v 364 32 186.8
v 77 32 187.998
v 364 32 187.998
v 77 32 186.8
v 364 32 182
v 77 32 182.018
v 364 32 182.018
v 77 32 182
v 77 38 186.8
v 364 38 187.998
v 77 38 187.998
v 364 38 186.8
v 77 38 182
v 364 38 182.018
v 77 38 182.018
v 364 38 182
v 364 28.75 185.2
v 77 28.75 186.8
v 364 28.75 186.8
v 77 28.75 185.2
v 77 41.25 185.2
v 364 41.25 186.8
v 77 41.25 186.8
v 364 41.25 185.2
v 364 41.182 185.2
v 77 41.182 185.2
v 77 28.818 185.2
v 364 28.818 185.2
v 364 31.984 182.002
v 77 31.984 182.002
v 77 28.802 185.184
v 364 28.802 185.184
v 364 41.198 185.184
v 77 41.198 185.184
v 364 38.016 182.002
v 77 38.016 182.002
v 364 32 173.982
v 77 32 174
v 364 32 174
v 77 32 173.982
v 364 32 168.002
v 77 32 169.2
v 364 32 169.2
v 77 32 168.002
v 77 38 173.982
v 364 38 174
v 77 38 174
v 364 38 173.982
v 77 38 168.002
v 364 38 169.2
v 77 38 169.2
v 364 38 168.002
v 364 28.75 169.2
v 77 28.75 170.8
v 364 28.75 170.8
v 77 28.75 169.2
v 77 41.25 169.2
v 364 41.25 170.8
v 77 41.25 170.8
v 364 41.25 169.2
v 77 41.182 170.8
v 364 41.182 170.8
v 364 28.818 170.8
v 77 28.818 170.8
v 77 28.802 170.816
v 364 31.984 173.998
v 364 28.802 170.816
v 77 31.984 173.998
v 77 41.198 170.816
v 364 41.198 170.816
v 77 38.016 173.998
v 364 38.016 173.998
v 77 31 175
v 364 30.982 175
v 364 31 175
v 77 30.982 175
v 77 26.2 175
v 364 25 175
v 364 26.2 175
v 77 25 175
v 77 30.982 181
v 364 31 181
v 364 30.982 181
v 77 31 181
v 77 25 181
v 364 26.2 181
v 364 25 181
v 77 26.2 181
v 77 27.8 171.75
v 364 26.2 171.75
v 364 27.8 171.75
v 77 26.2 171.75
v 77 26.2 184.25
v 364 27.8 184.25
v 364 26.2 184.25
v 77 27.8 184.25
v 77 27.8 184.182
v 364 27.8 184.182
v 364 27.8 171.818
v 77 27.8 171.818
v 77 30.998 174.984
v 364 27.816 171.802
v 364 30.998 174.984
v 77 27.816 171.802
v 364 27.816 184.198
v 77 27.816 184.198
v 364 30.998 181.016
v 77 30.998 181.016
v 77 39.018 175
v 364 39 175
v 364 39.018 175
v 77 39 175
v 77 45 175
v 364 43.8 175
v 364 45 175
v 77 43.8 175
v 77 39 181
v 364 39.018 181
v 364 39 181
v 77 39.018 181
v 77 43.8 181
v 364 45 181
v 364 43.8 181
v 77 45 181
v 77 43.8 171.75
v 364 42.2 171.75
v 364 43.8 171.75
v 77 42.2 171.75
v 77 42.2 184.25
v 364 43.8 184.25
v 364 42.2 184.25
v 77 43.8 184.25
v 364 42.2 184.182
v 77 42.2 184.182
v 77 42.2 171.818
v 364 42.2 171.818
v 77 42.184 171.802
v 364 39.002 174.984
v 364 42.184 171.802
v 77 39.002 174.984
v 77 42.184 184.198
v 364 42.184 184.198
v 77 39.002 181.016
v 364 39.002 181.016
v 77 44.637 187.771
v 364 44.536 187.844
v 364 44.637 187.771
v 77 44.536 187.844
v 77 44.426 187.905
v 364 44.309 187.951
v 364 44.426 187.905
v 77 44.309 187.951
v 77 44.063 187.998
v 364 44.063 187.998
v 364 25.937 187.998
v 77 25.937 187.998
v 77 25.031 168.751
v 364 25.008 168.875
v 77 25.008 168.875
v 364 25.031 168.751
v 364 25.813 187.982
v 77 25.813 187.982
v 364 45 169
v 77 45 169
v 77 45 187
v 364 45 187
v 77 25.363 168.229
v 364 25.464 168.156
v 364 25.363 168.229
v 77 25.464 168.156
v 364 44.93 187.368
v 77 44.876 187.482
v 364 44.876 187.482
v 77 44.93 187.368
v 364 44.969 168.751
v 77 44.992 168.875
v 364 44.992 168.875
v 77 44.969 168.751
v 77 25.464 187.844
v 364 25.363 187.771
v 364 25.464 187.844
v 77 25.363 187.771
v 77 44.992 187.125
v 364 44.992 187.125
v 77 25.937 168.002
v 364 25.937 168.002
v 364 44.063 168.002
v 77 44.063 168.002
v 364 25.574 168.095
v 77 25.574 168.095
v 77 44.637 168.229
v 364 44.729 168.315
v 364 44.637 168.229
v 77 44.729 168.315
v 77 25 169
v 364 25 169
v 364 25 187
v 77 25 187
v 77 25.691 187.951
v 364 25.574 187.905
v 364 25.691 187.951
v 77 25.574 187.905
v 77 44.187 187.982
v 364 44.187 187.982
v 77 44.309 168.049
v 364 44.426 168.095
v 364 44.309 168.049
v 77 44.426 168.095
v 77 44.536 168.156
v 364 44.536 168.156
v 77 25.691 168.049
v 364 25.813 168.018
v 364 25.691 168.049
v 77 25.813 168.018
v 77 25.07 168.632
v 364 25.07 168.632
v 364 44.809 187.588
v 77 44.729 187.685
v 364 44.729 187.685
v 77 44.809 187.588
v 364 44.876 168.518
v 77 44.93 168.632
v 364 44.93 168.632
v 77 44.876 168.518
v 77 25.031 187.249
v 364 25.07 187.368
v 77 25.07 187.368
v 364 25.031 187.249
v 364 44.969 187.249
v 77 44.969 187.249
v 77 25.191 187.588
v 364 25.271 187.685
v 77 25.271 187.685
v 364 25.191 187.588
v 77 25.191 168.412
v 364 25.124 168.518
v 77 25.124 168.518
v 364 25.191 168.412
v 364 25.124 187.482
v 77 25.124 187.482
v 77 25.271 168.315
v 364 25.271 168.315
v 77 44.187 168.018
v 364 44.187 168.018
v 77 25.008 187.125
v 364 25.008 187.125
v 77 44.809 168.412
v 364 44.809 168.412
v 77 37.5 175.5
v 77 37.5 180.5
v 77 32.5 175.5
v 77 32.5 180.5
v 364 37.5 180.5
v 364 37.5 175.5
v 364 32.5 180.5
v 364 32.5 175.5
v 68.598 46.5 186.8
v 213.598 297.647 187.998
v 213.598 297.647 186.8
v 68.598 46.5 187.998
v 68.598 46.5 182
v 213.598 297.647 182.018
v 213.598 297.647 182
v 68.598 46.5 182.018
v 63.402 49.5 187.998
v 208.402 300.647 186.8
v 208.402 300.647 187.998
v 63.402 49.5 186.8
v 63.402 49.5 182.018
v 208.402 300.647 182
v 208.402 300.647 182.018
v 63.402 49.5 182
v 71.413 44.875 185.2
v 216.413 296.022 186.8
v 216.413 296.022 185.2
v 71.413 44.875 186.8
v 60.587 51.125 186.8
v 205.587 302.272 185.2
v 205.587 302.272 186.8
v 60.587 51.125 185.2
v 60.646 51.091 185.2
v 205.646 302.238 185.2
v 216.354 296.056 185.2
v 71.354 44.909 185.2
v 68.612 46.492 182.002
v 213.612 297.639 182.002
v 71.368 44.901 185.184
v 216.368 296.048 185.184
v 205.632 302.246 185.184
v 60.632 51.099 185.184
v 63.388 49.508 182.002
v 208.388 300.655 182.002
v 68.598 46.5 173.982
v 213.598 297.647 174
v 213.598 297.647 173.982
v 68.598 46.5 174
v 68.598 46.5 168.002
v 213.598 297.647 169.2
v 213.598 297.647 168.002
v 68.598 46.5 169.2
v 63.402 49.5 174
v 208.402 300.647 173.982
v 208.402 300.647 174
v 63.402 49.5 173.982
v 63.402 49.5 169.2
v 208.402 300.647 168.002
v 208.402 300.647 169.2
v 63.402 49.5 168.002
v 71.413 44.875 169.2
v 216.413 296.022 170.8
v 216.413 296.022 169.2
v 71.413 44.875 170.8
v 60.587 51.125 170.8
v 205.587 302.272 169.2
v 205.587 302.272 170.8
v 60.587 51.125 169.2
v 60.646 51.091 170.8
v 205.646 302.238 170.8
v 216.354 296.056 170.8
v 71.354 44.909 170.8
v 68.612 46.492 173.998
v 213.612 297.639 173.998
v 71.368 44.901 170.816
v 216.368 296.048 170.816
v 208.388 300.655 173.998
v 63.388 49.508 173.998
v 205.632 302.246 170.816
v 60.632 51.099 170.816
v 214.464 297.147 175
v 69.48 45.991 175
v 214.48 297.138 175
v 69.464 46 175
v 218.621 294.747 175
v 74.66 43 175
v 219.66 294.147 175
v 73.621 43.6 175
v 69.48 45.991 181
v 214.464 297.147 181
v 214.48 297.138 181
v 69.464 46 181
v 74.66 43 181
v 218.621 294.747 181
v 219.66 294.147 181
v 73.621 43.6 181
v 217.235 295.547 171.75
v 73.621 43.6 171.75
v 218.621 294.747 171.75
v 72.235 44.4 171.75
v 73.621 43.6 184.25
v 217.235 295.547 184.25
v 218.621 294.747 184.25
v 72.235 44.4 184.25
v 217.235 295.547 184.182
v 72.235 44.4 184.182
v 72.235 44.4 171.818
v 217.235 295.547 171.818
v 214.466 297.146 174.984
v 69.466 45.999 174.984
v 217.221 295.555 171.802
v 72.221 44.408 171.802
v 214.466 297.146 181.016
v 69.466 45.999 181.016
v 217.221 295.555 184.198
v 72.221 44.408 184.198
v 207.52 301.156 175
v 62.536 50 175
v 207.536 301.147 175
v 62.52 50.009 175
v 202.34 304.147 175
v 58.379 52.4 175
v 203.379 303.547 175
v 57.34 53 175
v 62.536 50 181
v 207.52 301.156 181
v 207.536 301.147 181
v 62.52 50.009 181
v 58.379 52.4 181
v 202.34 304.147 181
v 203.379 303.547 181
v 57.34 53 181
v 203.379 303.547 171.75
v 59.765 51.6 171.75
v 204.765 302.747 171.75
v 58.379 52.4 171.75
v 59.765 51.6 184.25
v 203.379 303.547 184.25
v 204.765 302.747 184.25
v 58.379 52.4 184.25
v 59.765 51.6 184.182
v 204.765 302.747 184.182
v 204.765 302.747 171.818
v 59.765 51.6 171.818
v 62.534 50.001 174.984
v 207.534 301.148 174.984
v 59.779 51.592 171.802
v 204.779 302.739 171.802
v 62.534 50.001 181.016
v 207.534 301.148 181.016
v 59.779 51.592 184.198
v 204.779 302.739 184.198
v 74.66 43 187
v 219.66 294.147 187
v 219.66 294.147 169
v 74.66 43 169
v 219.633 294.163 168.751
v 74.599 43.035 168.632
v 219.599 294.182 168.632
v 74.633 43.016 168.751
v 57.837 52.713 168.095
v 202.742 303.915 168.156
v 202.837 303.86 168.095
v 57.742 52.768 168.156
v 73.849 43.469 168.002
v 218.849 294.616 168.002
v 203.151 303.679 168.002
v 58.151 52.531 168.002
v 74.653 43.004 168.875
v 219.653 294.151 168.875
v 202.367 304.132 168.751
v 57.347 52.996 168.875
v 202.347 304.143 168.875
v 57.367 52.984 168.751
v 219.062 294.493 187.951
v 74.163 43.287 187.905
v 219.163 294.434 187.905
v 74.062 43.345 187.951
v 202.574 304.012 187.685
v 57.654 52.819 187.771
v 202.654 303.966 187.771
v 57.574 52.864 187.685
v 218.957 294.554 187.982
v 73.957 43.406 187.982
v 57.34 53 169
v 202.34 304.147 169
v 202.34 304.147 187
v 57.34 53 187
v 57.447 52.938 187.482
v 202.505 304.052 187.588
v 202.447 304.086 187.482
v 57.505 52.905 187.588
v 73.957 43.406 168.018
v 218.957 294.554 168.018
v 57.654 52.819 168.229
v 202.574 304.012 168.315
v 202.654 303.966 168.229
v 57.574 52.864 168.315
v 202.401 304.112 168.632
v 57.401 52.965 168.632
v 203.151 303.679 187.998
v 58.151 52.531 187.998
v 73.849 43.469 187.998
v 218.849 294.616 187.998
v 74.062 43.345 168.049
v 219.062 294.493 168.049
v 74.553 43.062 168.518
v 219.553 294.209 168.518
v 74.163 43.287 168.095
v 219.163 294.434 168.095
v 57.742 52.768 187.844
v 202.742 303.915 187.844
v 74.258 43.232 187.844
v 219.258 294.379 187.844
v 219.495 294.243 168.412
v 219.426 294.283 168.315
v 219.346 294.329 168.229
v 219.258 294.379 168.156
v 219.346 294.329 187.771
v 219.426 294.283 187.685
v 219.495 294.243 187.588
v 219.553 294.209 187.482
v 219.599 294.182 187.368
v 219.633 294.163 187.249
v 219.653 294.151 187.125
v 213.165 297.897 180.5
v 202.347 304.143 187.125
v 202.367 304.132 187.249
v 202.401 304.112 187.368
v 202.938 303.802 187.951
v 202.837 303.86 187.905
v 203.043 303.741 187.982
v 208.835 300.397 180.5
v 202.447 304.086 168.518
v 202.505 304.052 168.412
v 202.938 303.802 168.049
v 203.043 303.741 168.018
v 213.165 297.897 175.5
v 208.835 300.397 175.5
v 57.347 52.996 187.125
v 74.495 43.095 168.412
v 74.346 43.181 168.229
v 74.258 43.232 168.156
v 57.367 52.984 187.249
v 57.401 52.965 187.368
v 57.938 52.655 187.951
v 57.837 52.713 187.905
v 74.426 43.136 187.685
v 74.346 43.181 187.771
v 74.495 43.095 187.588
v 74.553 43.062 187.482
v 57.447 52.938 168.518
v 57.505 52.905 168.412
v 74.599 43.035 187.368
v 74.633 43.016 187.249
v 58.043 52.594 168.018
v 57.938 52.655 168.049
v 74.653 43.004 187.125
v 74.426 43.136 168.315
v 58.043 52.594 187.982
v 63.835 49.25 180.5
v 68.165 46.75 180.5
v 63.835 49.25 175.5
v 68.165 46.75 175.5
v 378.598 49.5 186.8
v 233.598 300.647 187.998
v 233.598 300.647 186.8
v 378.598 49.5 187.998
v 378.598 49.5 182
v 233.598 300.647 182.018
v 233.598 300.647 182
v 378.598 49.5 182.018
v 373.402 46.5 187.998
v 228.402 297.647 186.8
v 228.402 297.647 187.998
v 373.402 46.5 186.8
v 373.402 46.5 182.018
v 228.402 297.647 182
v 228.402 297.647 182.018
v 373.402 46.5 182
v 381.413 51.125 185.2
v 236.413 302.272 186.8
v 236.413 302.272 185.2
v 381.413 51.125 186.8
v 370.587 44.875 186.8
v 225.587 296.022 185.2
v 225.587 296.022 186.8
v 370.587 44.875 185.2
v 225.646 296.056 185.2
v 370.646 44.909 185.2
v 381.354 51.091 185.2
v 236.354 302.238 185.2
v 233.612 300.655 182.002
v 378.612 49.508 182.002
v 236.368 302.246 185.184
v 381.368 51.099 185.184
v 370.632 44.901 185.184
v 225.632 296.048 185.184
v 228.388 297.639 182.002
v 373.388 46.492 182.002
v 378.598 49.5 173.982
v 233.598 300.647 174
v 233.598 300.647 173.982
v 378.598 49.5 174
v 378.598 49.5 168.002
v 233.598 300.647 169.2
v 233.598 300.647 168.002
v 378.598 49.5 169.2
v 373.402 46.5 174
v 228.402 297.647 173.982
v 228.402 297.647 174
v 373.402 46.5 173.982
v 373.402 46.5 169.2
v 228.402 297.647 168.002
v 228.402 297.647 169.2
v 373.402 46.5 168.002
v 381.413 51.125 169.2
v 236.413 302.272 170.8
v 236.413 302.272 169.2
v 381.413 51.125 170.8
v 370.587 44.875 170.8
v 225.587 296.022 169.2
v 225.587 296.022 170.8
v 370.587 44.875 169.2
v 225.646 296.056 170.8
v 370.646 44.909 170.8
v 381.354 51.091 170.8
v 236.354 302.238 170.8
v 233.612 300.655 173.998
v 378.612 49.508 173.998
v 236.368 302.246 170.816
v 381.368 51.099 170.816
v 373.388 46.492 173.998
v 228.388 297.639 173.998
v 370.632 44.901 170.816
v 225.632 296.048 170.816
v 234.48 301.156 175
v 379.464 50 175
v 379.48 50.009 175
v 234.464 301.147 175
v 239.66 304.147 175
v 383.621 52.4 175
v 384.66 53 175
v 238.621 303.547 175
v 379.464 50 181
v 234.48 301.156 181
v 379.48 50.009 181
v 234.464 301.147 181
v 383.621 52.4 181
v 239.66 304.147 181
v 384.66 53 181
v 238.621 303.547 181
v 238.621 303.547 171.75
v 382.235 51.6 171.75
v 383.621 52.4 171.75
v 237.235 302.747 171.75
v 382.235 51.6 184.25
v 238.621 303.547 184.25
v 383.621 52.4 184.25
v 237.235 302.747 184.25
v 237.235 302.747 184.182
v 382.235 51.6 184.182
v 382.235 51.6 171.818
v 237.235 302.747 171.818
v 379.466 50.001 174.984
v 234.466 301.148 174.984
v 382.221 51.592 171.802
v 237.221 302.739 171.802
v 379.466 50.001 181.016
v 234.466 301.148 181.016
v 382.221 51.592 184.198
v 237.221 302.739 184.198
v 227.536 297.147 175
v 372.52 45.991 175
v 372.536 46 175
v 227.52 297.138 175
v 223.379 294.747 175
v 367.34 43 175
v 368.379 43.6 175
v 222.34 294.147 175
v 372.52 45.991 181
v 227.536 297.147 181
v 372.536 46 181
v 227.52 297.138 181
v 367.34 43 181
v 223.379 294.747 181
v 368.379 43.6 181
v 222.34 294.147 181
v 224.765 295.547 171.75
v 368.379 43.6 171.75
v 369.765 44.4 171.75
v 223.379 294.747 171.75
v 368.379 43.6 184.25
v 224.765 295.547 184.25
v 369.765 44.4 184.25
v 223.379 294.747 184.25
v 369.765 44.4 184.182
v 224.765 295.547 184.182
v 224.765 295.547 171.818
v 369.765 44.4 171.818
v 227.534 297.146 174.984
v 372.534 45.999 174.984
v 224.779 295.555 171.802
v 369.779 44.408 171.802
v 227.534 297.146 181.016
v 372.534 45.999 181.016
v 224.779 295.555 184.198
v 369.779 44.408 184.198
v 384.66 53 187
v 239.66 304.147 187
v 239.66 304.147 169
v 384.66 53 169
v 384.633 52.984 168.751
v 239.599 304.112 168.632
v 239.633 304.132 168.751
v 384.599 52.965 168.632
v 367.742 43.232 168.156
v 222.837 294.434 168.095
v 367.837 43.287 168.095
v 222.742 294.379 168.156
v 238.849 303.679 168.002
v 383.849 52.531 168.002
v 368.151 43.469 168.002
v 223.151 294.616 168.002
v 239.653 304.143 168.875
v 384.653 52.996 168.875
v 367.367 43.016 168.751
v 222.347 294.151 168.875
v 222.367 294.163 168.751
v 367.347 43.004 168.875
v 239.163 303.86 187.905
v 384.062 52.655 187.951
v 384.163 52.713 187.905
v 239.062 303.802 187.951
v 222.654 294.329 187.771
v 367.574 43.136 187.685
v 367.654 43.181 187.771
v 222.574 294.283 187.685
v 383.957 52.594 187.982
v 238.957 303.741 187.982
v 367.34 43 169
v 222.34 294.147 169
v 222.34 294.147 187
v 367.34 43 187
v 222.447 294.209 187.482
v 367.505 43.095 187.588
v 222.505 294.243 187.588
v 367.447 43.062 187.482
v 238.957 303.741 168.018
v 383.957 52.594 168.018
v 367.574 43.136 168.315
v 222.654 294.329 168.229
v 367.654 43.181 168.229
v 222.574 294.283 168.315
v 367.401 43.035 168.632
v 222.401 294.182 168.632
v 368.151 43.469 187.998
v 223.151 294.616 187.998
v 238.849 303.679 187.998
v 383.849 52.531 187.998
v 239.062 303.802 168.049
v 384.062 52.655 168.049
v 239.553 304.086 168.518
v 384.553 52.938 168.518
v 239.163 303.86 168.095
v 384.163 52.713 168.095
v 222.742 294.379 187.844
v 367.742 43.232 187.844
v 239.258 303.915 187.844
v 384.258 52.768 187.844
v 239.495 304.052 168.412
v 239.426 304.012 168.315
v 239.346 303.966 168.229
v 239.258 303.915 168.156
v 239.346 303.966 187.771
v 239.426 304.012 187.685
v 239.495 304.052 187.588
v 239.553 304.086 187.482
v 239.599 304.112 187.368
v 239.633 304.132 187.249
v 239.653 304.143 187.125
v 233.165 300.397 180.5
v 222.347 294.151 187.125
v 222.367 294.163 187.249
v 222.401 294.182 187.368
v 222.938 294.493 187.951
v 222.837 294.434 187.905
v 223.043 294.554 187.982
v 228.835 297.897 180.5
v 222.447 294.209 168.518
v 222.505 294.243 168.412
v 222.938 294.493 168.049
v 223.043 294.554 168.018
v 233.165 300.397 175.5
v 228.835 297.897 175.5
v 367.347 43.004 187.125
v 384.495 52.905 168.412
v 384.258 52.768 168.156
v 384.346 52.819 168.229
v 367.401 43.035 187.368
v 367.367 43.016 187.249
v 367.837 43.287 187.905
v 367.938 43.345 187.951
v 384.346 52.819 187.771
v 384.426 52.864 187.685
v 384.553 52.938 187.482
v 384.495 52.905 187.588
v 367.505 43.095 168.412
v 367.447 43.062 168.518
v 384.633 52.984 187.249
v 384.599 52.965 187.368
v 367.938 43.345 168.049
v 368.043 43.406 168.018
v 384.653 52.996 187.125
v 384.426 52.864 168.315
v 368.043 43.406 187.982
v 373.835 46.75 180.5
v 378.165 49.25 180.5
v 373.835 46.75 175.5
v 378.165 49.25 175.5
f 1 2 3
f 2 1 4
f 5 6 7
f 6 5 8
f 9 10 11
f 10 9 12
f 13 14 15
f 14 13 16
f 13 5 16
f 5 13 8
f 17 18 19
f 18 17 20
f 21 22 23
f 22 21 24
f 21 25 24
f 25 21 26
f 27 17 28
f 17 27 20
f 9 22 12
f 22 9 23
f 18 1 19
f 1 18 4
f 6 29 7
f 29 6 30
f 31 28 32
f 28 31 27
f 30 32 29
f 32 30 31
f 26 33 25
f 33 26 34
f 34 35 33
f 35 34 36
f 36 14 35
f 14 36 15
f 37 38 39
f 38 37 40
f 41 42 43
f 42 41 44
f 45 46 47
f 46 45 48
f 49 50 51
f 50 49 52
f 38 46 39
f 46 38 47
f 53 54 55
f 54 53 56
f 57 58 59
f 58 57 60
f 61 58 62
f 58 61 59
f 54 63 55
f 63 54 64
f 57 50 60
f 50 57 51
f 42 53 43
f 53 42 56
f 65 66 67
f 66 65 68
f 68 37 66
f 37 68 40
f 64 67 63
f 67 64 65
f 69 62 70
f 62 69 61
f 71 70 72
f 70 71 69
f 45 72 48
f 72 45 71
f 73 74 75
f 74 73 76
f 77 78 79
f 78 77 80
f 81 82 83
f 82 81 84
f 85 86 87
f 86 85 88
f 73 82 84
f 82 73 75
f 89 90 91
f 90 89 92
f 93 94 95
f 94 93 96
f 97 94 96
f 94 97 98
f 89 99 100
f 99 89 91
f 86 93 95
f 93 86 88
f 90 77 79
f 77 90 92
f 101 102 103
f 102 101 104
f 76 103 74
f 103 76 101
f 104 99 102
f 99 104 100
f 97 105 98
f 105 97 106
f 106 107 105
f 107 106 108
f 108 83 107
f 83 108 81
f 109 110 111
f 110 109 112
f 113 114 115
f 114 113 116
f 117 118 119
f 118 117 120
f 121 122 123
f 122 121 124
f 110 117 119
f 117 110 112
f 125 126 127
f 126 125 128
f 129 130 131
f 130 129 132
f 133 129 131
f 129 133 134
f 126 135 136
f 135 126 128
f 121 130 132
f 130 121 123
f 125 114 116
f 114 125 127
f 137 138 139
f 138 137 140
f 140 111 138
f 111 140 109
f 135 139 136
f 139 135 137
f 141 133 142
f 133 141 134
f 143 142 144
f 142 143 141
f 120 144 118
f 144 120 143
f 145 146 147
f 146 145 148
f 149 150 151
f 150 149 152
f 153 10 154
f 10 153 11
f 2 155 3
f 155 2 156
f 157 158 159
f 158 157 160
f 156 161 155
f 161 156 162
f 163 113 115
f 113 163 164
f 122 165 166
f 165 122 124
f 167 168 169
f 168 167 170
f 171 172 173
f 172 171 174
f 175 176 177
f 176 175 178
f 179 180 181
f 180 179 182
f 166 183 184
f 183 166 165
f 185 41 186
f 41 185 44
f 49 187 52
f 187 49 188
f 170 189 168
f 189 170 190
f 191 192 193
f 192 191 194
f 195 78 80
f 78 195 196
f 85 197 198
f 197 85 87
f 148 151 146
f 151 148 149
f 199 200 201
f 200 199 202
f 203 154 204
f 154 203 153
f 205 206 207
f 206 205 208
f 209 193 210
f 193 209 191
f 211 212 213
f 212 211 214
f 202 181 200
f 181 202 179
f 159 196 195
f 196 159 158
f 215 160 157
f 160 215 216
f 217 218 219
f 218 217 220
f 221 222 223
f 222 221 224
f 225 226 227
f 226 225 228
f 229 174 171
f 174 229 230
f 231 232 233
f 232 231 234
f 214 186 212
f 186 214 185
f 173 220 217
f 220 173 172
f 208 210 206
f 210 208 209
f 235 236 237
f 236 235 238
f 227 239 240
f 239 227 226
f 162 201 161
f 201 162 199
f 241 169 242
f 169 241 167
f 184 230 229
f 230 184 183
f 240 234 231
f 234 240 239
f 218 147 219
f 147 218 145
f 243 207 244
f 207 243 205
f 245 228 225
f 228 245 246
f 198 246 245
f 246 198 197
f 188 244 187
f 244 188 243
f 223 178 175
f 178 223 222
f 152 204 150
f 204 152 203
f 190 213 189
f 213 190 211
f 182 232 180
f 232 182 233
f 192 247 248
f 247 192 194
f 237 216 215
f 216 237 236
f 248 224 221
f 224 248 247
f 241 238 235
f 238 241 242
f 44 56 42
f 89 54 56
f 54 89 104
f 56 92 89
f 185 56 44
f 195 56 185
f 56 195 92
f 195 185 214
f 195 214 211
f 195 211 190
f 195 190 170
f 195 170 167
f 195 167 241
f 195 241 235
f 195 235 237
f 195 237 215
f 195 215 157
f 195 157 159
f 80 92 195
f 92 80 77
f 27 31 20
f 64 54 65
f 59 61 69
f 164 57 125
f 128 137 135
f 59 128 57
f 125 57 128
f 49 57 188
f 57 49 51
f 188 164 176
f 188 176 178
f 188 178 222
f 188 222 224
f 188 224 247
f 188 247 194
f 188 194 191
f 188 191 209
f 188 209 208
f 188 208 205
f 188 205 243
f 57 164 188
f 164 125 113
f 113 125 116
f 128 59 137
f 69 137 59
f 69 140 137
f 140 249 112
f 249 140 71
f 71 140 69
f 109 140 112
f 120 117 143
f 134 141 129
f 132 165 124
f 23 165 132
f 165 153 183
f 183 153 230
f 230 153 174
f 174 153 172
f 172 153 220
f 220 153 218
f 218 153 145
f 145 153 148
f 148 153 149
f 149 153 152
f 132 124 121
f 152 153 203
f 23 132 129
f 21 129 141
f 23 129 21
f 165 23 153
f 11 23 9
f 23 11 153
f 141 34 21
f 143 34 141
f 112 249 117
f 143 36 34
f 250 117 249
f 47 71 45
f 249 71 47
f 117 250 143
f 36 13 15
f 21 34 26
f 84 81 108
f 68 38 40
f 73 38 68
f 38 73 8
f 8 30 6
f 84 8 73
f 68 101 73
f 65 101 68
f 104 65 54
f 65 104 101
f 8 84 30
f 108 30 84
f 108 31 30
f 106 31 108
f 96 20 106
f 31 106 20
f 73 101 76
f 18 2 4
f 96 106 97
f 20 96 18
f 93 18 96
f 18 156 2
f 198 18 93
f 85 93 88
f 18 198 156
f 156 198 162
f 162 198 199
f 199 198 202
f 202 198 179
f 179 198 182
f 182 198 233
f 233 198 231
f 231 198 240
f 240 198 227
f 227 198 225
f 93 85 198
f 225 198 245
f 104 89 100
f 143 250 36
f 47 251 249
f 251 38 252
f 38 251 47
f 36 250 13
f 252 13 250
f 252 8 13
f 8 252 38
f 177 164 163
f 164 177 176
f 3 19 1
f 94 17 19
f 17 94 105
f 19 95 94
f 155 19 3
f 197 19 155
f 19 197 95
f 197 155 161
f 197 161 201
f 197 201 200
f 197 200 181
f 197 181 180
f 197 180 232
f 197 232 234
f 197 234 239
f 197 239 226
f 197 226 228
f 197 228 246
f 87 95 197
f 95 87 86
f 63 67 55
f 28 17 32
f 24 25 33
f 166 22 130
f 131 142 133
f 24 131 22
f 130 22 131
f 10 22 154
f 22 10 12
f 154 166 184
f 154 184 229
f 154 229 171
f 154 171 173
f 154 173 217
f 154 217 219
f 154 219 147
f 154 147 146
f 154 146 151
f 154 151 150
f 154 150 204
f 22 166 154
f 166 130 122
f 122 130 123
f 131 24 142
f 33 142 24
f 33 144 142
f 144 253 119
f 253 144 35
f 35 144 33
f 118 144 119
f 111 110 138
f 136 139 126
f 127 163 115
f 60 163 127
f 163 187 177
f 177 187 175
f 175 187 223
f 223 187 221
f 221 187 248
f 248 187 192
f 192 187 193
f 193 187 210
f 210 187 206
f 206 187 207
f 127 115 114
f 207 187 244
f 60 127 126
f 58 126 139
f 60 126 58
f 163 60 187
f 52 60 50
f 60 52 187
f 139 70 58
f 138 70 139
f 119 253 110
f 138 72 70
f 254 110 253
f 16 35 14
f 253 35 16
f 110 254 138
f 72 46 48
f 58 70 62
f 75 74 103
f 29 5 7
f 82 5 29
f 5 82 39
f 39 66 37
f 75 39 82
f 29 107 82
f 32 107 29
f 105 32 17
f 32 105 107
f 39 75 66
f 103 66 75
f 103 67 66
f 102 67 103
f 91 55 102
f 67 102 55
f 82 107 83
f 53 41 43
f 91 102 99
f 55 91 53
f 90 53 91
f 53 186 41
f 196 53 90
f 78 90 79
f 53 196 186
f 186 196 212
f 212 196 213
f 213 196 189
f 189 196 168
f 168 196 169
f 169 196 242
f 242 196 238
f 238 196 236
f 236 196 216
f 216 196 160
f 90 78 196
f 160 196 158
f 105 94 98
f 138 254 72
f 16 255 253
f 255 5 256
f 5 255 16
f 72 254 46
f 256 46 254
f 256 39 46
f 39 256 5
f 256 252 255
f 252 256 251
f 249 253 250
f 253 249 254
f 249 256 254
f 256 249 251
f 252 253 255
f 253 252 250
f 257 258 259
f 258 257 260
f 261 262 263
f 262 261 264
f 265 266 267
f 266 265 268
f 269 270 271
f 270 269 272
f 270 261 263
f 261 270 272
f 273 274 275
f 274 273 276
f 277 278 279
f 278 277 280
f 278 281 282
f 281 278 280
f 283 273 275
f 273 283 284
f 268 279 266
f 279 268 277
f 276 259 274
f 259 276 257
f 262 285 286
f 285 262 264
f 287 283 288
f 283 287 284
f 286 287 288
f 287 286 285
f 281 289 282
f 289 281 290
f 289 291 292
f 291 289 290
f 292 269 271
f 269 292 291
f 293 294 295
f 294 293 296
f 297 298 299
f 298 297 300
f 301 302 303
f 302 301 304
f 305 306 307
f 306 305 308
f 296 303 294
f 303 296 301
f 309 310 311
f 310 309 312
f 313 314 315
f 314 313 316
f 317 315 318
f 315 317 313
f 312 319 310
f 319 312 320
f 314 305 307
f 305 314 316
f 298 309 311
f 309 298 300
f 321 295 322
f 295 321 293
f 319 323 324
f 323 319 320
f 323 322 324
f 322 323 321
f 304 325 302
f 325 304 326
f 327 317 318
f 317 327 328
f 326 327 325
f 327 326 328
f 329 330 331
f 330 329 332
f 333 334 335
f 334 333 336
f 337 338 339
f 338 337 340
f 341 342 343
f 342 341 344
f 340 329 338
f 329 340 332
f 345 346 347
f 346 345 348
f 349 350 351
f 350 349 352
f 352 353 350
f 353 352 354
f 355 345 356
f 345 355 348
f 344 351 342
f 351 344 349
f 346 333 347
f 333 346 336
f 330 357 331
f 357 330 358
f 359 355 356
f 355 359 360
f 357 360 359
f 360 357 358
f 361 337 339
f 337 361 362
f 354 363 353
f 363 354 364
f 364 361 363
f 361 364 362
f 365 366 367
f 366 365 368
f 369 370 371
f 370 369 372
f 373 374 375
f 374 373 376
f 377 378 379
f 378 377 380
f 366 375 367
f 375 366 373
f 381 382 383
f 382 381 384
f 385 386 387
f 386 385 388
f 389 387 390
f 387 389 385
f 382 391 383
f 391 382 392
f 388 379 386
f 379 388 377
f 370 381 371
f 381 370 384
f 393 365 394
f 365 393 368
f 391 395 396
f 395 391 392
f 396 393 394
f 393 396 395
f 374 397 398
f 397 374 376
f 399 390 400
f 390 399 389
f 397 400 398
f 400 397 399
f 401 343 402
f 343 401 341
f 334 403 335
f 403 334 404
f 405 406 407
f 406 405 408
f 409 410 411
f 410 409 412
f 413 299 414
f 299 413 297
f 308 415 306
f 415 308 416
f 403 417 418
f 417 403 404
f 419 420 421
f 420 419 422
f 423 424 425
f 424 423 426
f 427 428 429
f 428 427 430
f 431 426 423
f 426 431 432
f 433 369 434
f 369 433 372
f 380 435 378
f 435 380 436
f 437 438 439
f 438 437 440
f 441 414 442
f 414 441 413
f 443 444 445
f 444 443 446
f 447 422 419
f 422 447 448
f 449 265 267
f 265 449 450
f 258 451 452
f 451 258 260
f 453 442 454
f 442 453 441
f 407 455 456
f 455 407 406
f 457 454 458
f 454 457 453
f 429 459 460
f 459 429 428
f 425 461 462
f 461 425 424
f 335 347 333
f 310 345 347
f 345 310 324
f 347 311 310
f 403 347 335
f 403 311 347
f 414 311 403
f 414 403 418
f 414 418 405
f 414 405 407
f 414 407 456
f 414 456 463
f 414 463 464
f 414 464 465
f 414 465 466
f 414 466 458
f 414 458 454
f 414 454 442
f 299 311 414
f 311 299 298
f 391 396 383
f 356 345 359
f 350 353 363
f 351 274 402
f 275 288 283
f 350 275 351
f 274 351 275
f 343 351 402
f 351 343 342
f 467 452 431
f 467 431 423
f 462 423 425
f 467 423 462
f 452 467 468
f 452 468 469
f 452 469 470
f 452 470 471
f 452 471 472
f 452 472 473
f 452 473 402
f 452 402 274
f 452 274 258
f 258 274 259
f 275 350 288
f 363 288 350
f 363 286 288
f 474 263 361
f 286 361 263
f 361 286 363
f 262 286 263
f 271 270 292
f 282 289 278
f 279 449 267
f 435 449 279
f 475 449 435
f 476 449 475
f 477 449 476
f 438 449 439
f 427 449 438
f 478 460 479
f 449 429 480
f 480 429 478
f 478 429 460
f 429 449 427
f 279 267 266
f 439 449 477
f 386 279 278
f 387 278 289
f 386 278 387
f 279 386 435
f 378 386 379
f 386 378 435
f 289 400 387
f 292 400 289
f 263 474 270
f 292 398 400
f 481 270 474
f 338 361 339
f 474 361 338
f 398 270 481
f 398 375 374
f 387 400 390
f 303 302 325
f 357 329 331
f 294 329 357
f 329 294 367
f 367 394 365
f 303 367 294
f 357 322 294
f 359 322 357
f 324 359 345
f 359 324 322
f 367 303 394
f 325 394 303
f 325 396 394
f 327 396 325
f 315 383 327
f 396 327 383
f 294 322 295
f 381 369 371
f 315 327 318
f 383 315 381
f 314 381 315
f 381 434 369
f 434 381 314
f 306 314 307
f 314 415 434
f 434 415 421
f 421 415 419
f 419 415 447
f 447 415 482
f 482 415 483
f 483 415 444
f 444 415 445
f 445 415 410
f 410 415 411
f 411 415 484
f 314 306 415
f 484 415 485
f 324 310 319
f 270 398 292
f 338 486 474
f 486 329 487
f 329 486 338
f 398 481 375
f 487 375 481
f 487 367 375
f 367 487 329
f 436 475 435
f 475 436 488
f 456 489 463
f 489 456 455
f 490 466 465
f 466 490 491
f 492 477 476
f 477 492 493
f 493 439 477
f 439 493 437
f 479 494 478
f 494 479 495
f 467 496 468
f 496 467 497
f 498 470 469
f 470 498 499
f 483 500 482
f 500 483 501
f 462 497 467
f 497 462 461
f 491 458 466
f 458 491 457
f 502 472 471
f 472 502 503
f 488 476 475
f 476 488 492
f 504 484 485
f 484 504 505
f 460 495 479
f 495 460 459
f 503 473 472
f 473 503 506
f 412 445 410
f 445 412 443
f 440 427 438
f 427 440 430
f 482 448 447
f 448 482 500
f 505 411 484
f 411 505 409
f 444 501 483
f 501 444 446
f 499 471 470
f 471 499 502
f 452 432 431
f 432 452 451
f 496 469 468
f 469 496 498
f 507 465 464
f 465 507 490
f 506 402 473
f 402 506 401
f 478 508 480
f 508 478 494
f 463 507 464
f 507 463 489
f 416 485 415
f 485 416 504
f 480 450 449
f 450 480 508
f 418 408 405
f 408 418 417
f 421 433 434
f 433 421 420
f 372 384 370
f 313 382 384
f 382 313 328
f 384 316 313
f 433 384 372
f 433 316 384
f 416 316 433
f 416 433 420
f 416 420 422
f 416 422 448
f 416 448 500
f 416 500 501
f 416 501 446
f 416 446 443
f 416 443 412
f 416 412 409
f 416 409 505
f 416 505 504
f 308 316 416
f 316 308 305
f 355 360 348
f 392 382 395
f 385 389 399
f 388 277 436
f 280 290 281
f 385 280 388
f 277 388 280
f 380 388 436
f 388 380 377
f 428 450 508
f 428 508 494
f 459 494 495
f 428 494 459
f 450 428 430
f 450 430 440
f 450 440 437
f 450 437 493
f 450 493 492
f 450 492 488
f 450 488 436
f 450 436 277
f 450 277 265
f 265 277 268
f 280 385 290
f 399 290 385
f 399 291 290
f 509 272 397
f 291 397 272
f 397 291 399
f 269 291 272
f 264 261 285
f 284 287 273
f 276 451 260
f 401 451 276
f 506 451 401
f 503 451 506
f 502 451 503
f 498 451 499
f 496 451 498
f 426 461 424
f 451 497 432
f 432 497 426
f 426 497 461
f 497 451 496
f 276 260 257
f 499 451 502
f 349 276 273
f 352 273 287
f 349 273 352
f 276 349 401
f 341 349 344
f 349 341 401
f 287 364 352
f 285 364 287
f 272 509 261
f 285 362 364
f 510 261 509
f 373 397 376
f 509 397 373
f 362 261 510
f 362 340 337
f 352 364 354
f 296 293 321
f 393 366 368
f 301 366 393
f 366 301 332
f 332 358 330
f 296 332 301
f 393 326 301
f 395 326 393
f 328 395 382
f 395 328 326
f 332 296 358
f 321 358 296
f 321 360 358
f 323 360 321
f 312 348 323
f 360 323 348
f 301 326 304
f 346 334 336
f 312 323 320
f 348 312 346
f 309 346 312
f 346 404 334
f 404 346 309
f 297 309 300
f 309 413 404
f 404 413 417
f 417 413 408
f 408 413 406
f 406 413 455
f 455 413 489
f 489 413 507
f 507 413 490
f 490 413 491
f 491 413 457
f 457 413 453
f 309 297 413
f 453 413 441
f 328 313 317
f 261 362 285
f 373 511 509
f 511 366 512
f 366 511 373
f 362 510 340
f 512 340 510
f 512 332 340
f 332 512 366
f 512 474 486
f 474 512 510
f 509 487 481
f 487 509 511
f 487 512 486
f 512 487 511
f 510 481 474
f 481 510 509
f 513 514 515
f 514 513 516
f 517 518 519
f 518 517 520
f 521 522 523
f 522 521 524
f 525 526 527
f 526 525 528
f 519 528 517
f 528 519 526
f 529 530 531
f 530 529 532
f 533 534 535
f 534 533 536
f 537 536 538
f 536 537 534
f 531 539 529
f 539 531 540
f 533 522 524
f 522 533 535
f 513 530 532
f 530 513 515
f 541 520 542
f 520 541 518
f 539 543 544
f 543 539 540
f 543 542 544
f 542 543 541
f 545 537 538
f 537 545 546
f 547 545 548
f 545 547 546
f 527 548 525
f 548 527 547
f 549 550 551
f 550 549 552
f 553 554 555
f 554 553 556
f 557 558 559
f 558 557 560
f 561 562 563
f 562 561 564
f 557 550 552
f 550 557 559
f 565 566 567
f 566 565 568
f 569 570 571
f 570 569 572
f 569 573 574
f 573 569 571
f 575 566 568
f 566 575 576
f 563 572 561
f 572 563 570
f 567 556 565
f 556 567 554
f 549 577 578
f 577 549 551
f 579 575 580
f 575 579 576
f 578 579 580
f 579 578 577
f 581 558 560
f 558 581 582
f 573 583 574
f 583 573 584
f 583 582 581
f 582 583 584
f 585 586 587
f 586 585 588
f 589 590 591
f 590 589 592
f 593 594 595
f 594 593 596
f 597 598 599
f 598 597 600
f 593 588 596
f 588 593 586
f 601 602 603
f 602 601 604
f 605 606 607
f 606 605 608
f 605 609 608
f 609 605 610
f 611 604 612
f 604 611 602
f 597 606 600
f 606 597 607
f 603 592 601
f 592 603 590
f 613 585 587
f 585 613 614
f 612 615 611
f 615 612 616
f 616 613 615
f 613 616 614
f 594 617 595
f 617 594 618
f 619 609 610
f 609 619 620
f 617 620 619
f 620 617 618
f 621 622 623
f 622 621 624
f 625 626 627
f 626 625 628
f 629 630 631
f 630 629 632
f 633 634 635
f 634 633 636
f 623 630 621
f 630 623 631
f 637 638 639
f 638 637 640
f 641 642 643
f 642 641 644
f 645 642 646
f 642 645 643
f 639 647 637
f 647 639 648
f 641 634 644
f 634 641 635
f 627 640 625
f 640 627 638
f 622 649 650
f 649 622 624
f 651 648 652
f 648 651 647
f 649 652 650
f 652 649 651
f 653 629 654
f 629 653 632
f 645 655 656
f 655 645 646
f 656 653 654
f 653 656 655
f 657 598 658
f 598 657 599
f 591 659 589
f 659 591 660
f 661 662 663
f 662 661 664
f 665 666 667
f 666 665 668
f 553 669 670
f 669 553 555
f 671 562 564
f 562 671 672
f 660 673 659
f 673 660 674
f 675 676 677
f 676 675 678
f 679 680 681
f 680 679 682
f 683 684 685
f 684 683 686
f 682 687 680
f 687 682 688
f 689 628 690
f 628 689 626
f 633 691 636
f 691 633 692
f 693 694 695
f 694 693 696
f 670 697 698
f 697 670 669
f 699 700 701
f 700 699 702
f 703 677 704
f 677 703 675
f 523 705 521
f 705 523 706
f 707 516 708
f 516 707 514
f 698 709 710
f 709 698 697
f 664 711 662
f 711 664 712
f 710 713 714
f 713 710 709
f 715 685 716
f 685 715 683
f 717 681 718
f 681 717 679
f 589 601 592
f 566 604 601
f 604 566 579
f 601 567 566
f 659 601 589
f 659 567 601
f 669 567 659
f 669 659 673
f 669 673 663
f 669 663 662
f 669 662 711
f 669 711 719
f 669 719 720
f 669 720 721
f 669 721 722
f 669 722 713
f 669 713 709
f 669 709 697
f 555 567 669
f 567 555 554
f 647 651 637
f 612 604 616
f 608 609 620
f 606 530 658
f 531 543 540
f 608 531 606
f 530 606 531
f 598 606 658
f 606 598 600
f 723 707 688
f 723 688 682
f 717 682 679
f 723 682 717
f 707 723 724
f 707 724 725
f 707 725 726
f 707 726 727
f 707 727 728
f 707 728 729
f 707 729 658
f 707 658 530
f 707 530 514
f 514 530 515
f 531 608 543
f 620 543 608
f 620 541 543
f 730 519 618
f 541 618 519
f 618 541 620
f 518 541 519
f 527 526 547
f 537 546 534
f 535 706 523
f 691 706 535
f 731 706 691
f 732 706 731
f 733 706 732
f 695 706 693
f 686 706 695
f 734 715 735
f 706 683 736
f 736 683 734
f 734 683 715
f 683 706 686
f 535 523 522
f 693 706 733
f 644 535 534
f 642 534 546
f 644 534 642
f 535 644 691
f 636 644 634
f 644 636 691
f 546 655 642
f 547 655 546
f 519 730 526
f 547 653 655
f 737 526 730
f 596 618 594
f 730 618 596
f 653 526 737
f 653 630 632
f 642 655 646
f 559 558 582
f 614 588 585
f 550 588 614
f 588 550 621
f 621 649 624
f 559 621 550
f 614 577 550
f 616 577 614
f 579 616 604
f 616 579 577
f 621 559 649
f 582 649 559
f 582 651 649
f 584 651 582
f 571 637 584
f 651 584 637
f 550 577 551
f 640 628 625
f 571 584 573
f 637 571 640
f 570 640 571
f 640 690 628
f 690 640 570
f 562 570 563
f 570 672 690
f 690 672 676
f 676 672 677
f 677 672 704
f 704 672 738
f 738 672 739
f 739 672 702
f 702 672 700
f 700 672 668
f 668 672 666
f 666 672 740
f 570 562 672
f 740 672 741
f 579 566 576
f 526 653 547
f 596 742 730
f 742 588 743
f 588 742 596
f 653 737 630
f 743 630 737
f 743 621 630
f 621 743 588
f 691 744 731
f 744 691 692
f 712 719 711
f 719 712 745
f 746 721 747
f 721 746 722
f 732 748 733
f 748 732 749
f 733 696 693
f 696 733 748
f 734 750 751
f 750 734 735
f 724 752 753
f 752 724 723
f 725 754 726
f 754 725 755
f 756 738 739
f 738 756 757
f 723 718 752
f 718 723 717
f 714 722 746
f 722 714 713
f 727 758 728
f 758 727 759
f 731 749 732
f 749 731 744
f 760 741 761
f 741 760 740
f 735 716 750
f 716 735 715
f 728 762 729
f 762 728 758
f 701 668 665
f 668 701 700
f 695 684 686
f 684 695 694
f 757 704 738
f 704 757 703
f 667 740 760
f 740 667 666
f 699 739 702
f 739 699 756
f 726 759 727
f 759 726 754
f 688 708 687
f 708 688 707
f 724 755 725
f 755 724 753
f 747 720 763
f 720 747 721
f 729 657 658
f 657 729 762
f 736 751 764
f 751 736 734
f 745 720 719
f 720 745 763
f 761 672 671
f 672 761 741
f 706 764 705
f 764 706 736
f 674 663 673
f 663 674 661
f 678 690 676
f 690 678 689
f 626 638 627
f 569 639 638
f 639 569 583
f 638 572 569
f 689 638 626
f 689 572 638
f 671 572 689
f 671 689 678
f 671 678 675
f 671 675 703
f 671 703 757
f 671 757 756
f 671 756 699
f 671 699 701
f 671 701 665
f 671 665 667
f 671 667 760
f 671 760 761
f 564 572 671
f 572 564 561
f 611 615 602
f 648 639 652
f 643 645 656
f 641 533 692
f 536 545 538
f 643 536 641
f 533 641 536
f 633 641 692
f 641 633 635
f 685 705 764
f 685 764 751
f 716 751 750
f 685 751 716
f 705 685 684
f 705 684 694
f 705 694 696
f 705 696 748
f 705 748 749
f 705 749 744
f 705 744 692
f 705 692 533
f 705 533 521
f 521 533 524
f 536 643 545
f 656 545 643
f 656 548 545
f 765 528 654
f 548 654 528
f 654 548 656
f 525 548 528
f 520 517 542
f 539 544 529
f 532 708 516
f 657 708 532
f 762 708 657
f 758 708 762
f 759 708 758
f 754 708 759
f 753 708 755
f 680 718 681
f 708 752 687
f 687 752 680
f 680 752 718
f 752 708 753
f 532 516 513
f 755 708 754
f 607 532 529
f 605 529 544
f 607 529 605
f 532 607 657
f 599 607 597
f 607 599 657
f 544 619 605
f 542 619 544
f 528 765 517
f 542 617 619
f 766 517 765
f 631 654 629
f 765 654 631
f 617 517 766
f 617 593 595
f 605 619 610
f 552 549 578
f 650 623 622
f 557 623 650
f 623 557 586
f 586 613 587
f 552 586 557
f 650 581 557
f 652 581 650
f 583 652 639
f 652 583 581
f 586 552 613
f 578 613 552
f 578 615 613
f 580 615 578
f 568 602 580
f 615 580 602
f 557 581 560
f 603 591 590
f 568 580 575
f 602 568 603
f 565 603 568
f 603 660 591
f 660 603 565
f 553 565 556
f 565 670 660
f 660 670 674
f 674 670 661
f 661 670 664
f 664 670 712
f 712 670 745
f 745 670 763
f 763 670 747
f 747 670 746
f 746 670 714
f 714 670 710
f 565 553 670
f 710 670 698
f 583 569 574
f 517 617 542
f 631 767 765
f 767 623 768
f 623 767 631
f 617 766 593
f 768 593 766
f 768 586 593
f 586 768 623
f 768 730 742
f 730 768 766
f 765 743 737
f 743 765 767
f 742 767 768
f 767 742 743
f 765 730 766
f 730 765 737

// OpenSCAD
// file: 20x20_Profile.scad
/*
20x20 Aluminium T-slot profile from modeus...
*/



 module AluProfile(Lenght){
color( "Gainsboro", 1 ) {
$fn=50;     
    
union () {     
RealLenght = Lenght / 2 ; // bug in OpenScad ?
    difference (){    
        union (){    // the Aluminium base         
           translate ([1,1,0]){ 
               minkowski(){
                cube([18,18,RealLenght]);
                cylinder(r=1,h=RealLenght);
                }}     
        }
// Difference starts here 
   translate ([10,10,0]){   // center hole
       cube([5,5,Lenght*2+1], true);
    }         
        
   union (){                // first T-Slot South
    translate ([10,2,0]){  
       cube([6,8,Lenght*2+1], true);     
    }
   translate ([10,3,0]){  
       cube([8,2,Lenght*2+1], true);      
  }
     translate ([10,2,0]){  
       cube([12.5,1.6,Lenght*2+1], true);      
  }
   translate ([13.9,3.7,0]){ 
       rotate ([0,0,45]) { 
       cube([2,4.5,Lenght*2+1], true);      
  }}
     translate ([6.1,3.7,0]){ 
       rotate ([0,0,45]) { 
       cube([4.5,2,Lenght*2+1], true);      
  }}    
    }  

   translate ([0,20,0]){    // Second T-Slot North
    mirror ([0,1,0]) { 
   union (){                
    translate ([10,2,0]){  
       cube([6,8,Lenght*2+1], true);     
    }
   translate ([10,3,0]){  
       cube([8,2,Lenght*2+1], true);      
  }
     translate ([10,2,0]){  
       cube([12.5,1.6,Lenght*2+1], true);      
  }
   translate ([13.9,3.7,0]){ 
       rotate ([0,0,45]) { 
       cube([2,4.5,Lenght*2+1], true);      
  }}
     translate ([6.1,3.7,0]){ 
       rotate ([0,0,45]) { 
       cube([4.5,2,Lenght*2+1], true);      
  }}    
    }  
}}

translate ([20,0,0]){ // third and forth T-Slot East West
rotate ([0,0,90]) { 
   union (){                
    translate ([10,2,0]){  
       cube([6,8,Lenght*2+1], true);     
    }
   translate ([10,3,0]){  
       cube([8,2,Lenght*2+1], true);      
  }
     translate ([10,2,0]){  
       cube([12.5,1.6,Lenght*2+1], true);      
  }
   translate ([13.9,3.7,0]){ 
       rotate ([0,0,45]) { 
       cube([2,4.5,Lenght*2+1], true);      
  }}
     translate ([6.1,3.7,0]){ 
       rotate ([0,0,45]) { 
       cube([4.5,2,Lenght*2+1], true);      
  }}    
    } 
   translate ([0,20,0]){    
    mirror ([0,1,0]) { 
   union (){                
    translate ([10,2,0]){  
       cube([6,8,Lenght*2+1], true);     
    }
   translate ([10,3,0]){  
       cube([8,2,Lenght*2+1], true);      
  }
     translate ([10,2,0]){  
       cube([12.5,1.6,Lenght*2+1], true);      
  }
   translate ([13.9,3.7,0]){ 
       rotate ([0,0,45]) { 
       cube([2,4.5,Lenght*2+1], true);      
  }}
     translate ([6.1,3.7,0]){ 
       rotate ([0,0,45]) { 
       cube([4.5,2,Lenght*2+1], true);      
  }}    
    }
}}}}   


  } 
}}}



//AluProfile(10);
// main file
/*
Heatbed
*/
include <20x20_Profile.scad>

// Place the alumium frame for the heatbed
    translate ([77,45,188]){ rotate ([270,0,-90])
    translate ([0,0,0])AluProfile(287);}
    
    translate ([66,48,188]){ rotate ([270,0,-30])
    translate ([-10,0,0])AluProfile(290);}
    
    translate ([376,48,188]){ rotate ([270,0,30])
    translate ([-10,0,0])AluProfile(290);}
